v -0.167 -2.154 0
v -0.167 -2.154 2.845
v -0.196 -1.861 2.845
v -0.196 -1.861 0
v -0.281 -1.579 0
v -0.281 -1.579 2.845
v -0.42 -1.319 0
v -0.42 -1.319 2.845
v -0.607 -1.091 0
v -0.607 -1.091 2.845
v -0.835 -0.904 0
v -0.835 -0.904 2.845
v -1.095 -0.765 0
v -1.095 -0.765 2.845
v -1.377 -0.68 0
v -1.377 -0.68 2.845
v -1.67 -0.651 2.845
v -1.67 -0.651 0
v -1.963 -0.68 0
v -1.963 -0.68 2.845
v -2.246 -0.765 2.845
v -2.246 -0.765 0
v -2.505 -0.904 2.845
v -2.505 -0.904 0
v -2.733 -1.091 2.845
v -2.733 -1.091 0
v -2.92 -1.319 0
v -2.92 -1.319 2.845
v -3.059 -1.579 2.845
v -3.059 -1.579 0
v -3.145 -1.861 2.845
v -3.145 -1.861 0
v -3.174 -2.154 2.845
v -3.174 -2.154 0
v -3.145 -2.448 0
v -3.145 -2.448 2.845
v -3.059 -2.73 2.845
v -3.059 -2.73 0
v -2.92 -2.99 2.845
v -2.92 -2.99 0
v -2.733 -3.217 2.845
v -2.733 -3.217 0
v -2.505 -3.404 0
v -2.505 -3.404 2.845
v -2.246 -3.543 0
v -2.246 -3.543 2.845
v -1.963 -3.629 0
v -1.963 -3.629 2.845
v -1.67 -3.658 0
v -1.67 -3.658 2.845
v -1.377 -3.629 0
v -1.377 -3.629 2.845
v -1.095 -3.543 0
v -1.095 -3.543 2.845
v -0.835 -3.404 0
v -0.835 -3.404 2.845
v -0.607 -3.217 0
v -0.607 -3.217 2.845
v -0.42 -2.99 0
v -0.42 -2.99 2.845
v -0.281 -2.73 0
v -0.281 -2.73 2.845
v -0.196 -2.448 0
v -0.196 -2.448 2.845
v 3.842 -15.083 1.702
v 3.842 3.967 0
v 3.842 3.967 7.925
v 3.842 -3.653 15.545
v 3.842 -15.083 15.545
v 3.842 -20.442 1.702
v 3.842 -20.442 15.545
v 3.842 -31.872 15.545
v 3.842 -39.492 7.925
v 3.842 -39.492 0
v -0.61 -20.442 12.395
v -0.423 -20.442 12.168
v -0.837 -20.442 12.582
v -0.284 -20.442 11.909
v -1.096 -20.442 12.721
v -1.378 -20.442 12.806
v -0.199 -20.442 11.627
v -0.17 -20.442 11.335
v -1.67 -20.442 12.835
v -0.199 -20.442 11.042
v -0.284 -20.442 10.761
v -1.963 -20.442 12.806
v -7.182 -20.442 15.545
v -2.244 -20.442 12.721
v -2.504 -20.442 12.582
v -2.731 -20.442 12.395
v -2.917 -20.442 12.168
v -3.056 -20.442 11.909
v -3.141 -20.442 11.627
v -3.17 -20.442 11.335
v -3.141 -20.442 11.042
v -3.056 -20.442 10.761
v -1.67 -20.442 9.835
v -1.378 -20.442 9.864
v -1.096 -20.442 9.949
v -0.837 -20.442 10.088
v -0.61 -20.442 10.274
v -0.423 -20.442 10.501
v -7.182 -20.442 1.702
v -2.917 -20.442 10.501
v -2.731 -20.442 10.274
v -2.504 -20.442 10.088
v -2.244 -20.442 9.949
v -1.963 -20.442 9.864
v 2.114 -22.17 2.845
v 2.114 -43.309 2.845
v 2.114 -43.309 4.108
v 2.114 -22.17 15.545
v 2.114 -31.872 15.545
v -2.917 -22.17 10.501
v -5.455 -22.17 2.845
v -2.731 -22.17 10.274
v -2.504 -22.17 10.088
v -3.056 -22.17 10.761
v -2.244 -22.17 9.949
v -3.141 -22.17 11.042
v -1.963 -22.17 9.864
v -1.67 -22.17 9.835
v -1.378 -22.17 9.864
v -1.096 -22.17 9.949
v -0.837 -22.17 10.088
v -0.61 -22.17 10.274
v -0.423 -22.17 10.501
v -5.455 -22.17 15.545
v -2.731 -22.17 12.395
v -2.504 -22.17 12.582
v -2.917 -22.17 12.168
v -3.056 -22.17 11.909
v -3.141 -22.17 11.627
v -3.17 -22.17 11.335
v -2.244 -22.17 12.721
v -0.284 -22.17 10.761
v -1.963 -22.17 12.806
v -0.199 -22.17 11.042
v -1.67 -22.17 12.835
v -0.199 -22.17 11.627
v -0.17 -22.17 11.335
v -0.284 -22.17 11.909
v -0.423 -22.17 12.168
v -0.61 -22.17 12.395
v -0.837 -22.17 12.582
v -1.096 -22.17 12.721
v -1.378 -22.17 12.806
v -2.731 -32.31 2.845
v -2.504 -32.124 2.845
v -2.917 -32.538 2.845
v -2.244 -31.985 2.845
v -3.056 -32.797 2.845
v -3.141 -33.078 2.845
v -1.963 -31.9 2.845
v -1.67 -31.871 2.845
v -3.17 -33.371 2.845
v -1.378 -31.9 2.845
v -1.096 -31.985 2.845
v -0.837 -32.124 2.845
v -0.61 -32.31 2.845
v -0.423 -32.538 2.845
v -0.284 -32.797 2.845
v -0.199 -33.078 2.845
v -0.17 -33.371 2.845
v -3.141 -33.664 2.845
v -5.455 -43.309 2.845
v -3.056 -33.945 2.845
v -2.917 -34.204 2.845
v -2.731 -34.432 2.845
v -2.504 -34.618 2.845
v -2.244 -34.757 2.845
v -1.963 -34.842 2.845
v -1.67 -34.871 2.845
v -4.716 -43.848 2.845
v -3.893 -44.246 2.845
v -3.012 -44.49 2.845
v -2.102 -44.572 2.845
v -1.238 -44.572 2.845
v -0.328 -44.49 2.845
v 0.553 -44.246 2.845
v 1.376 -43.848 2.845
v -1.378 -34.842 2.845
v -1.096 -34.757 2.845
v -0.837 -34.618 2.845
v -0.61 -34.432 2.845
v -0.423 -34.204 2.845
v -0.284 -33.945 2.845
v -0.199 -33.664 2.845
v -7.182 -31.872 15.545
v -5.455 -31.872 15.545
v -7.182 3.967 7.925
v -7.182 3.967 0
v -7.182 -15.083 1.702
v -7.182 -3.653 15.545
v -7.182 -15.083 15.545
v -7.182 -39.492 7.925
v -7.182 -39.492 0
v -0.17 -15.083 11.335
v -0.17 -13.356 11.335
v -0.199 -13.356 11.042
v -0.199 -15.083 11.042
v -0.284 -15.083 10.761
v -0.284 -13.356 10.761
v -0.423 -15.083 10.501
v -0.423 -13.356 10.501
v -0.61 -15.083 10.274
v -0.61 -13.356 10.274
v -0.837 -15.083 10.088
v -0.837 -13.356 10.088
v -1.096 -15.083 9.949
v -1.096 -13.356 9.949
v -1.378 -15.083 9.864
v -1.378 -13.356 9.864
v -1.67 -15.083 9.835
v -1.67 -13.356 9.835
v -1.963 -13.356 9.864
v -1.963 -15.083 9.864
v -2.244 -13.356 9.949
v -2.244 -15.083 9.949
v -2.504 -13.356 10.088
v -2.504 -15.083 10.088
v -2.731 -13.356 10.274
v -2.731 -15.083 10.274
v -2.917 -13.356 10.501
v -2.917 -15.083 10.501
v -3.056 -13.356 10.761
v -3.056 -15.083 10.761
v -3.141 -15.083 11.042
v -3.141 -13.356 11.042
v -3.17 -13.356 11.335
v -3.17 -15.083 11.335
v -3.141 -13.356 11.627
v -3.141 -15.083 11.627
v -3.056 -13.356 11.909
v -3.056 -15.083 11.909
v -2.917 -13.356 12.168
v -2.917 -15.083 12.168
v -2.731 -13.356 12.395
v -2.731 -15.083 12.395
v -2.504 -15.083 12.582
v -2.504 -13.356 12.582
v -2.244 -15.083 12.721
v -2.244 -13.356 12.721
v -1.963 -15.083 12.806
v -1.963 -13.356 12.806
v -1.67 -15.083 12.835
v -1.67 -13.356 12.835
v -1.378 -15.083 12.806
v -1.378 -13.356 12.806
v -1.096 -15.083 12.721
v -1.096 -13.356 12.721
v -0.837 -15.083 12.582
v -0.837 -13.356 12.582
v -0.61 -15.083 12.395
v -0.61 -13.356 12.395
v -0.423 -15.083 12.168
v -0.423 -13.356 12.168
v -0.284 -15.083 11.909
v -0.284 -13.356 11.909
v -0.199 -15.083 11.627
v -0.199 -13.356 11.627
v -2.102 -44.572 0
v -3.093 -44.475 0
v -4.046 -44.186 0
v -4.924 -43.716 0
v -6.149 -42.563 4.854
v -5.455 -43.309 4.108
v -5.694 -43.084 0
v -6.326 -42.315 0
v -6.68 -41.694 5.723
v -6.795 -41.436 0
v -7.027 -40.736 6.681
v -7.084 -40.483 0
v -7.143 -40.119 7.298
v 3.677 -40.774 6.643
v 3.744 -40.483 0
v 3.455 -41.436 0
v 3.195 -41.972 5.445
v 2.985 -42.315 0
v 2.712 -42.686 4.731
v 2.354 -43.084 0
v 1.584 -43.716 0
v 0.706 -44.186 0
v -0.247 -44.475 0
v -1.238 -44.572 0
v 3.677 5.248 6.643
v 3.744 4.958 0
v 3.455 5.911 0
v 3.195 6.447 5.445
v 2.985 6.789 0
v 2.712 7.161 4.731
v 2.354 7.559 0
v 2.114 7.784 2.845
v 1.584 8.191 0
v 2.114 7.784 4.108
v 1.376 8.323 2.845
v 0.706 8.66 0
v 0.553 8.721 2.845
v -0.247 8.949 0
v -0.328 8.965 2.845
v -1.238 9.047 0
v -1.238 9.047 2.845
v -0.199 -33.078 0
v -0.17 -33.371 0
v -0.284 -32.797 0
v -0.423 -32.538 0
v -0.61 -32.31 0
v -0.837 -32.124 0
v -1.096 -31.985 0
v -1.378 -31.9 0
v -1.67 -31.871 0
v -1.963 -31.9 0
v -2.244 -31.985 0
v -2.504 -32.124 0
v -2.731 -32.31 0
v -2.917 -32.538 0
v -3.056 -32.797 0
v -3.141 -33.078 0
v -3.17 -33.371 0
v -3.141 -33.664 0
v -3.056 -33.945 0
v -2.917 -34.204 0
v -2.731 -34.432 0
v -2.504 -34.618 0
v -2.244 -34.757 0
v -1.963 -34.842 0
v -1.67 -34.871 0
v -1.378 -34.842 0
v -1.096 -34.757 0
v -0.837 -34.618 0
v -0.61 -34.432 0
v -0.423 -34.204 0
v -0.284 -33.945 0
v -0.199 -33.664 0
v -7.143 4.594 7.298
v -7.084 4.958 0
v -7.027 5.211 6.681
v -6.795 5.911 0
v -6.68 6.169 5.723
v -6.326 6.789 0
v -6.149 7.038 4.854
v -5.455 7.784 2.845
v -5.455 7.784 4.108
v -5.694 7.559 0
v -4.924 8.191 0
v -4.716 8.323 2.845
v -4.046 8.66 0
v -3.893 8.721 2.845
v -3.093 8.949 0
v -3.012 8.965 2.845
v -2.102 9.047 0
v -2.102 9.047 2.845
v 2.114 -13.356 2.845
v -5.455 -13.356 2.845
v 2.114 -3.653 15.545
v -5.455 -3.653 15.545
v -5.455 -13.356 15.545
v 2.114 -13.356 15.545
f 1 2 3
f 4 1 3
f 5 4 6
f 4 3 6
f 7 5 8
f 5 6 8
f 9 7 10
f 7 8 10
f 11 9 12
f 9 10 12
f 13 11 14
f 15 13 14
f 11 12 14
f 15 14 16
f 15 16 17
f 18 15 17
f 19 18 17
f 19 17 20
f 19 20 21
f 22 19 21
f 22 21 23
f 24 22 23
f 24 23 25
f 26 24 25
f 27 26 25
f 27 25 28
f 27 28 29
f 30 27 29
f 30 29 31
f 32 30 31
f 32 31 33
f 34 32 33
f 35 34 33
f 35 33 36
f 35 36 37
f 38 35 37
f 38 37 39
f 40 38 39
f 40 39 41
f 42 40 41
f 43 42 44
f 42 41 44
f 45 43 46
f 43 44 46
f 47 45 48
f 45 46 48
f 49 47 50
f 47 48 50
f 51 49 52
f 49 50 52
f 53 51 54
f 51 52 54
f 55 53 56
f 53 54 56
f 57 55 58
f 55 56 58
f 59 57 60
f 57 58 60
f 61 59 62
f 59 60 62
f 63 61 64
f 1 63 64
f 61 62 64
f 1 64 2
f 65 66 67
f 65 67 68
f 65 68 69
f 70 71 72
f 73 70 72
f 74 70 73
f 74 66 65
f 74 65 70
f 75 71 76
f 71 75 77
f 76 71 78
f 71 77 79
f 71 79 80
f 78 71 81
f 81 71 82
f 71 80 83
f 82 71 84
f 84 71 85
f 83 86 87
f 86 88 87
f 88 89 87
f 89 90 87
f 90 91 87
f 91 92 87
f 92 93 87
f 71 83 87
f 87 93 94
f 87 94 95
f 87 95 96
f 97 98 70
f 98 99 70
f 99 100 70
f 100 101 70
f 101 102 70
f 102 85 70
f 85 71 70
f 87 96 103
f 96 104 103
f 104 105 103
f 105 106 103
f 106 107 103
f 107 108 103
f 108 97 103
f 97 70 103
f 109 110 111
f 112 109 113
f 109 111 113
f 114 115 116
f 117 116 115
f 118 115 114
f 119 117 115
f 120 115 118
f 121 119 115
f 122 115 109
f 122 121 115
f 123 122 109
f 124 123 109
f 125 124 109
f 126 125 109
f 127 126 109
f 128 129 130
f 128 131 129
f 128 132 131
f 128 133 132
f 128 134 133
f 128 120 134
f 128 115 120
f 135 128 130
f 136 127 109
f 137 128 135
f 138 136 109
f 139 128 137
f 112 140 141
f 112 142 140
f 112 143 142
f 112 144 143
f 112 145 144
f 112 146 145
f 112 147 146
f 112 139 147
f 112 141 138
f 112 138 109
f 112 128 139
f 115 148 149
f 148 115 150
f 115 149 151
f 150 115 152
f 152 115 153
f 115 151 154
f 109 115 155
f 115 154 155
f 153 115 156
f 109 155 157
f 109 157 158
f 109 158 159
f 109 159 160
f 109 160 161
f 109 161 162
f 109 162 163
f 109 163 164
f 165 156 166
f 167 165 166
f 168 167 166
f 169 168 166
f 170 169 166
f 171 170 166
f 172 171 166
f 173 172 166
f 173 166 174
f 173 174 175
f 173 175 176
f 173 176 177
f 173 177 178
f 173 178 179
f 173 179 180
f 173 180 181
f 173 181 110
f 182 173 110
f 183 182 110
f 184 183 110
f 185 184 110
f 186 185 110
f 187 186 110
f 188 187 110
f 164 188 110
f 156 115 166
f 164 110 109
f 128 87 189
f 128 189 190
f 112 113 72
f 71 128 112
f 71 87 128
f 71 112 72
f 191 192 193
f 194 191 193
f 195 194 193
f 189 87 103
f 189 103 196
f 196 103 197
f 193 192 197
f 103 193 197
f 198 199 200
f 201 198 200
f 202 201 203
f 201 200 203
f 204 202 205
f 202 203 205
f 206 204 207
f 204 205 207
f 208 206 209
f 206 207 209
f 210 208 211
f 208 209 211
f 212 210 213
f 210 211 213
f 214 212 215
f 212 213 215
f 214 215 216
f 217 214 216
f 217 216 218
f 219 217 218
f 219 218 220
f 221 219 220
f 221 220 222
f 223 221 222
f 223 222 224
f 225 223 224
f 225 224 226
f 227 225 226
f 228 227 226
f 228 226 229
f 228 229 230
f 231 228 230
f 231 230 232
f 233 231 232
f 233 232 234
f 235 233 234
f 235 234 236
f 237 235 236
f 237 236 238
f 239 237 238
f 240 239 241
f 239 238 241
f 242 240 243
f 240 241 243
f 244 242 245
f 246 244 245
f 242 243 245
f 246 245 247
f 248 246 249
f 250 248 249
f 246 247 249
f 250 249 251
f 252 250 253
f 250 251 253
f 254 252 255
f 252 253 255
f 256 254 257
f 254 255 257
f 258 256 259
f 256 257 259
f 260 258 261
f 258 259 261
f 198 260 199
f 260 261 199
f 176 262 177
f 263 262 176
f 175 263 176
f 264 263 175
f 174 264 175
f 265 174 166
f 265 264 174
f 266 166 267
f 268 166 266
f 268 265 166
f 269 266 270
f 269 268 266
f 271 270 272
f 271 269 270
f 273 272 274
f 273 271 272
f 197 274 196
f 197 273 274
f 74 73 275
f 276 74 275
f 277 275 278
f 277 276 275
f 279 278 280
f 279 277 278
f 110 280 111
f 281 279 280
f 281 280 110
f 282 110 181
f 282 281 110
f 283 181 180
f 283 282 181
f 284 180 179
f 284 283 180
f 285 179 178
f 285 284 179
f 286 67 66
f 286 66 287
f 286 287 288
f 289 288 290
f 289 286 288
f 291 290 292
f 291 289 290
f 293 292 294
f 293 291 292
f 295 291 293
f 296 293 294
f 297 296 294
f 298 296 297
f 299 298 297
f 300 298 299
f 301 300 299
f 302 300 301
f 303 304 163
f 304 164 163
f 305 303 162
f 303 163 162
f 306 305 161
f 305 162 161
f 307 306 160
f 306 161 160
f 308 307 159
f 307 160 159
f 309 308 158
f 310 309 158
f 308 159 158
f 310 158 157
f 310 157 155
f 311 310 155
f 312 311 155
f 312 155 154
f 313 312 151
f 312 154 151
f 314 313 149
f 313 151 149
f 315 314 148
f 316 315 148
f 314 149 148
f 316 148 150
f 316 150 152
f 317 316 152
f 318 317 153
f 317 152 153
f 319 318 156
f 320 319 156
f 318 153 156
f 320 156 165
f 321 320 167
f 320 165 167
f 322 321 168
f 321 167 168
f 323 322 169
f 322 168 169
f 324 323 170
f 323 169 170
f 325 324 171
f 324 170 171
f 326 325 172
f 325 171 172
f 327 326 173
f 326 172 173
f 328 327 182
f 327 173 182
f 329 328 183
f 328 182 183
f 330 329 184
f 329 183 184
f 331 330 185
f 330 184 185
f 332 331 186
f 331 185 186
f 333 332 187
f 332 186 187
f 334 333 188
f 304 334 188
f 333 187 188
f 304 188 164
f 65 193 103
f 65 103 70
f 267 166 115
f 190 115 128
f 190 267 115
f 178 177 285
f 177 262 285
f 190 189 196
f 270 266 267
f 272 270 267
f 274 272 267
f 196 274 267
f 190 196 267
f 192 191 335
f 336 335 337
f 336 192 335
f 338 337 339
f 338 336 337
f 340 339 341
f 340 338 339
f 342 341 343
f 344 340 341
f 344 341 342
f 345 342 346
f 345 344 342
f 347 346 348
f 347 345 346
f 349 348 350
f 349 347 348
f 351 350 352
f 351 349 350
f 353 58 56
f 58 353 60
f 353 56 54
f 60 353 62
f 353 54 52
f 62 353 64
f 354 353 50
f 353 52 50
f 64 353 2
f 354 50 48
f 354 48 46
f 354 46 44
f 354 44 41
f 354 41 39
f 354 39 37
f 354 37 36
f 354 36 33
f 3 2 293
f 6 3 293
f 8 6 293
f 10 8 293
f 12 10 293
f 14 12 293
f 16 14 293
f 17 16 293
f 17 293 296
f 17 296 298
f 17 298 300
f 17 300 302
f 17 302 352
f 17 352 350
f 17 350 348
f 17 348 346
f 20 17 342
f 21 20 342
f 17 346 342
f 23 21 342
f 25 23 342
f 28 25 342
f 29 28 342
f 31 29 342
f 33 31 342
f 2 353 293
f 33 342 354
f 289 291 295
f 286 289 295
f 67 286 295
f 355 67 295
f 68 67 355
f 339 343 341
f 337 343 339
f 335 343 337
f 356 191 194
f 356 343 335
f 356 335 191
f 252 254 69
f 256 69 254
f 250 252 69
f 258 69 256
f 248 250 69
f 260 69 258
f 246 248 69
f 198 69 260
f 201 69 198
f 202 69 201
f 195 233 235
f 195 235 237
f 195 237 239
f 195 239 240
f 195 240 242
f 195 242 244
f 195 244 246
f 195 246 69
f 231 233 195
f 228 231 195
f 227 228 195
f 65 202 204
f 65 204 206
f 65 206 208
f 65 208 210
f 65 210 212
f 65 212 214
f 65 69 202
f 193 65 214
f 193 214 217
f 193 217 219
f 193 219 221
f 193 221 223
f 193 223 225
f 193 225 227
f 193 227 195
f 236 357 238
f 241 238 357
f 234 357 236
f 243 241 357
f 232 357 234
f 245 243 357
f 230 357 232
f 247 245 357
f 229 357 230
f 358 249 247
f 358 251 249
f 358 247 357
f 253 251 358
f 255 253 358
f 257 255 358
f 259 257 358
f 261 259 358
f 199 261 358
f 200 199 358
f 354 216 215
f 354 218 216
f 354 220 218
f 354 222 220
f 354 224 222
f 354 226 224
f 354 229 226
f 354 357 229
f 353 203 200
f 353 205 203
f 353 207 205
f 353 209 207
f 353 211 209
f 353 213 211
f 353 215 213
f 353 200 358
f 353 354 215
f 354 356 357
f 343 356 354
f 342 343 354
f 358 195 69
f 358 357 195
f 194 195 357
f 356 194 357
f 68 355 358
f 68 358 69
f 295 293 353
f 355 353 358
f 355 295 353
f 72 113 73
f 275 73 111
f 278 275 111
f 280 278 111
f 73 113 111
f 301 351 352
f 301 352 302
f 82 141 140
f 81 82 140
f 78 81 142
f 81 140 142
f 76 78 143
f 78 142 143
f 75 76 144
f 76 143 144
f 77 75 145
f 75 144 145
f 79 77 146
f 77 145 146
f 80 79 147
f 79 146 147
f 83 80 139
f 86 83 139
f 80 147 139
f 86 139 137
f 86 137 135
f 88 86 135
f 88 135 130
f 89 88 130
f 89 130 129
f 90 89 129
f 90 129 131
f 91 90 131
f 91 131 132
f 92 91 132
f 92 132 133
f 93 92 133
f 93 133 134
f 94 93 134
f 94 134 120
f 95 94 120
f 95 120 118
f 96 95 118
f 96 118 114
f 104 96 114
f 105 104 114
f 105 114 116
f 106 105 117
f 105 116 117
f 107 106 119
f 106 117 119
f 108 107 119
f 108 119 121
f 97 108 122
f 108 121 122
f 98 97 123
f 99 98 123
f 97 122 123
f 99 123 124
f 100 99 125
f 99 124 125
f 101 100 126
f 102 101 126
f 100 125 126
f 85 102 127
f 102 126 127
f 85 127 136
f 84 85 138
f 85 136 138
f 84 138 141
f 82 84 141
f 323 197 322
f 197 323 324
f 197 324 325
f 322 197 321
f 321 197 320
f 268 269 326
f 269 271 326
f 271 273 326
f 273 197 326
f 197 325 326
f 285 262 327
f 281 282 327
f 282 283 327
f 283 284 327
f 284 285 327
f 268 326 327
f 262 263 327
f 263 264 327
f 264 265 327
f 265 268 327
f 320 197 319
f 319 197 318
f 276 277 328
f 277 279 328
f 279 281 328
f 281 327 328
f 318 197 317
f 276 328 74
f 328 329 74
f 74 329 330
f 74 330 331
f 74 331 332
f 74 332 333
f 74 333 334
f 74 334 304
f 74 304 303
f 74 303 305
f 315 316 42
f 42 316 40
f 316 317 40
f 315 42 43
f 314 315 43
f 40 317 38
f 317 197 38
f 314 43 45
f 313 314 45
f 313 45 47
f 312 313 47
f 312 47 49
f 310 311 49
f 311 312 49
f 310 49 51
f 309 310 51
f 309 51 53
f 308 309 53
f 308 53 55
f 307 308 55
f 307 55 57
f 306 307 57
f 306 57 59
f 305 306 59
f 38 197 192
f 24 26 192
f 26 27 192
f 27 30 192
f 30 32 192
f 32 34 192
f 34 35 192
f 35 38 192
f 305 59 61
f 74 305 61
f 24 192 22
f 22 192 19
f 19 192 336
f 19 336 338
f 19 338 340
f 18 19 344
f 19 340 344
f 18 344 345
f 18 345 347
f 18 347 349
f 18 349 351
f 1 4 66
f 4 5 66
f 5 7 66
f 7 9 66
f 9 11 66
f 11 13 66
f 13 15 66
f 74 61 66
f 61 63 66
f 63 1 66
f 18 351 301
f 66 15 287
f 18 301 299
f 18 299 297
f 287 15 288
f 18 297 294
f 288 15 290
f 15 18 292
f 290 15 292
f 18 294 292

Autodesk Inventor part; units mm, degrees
ref_plane "YZ Plane" through (0, 0, 0) normal (1, 0, 0) x (0, 1, 0)
ref_plane "XZ Plane" through (0, 0, 0) normal (0, 1, 0) x (-1, 0, 0)
ref_plane "XY Plane" through (0, 0, 0) normal (0, 0, 1) x (1, 0, 0)
sketch "Sketch1" plane through (0, 0, 0) normal (0, 0, 1) x (1, 0, 0)
  line L0 (-7.182, 9.0471) -> (3.8416, 9.0471)
  line L1 (3.8416, 9.0471) -> (3.8416, -44.5723)
  line L2 (3.8416, -44.5723) -> (-7.182, -44.5723)
  line L3 (-7.182, -44.5723) -> (-7.182, 9.0471)
  point P0 (0, 0)
  dimension "d0" = 11.0236
  dimension "d1" = 53.6194
extrude "Extrusion1" add sketch "Sketch1" along normal blind 1.7018
sketch "Sketch2" plane through (0, 0, 1.7018) normal (0, 0, 1) x (1, 0, 0)
  line L0 (3.8416, 9.0471) -> (-7.182, 9.0471) projected
  line L1 (3.8416, -44.5723) -> (3.8416, 9.0471) projected
  line L2 (-7.182, 9.0471) -> (3.8416, 9.0471)
  line L3 (3.8416, 9.0471) -> (3.8416, -15.0829)
  line L4 (3.8416, -15.0829) -> (-7.182, -15.0829)
  line L5 (-7.182, -15.0829) -> (-7.182, 9.0471)
  point P0 (0, 0)
  dimension "d4" = 24.13
extrude "Extrusion2" add sketch "Sketch2" along normal blind 13.843
sketch "Sketch3" plane through (-7.182, 9.0471, 0) normal (0, 1, 0) x (1, 0, 0)
  circle A0 centre (5.5118, -11.3348) radius 1.5
  line L0 (11.0236, -15.5448) -> (0, -15.5448) projected
  point P0 (7.182, 0)
  dimension "d7" = 3
  dimension "d8" = 4.21
extrude "Extrusion3" cut sketch "Sketch3" against normal blind 25.4
chamfer "Chamfer1" distance 12.7 angle 45 1 edges at (-1.6702, 9.0471, 15.5448)
sketch "Sketch4" plane through (-7.182, 9.0471, 0) normal (0, 1, 0) x (1, 0, 0)
  line L0 (11.0236, -2.8448) -> (0, -2.8448) projected
  line L1 (0, -15.5448) -> (11.0236, -15.5448) projected
  line L2 (1.7272, -2.8448) -> (9.2964, -2.8448)
  line L3 (9.2964, -2.8448) -> (9.2964, -15.5448)
  line L4 (9.2964, -15.5448) -> (1.7272, -15.5448)
  line L5 (1.7272, -15.5448) -> (1.7272, -2.8448)
  point P0 (7.182, 0)
  dimension "d14" = 1.7272
  dimension "d15" = 1.7272
extrude "Extrusion4" cut sketch "Sketch4" against normal blind 22.4028
sketch "Sketch5" plane through (0, 0, 1.7018) normal (0, 0, 1) x (1, 0, 0)
  line L0 (-7.182, -44.5723) -> (3.8416, -44.5723) projected
  line L1 (3.8416, 9.0471) -> (3.8416, -44.5723) projected
  line L2 (-7.182, -44.5723) -> (3.8416, -44.5723)
  line L3 (3.8416, -44.5723) -> (3.8416, -20.4423)
  line L4 (3.8416, -20.4423) -> (-7.182, -20.4423)
  line L5 (-7.182, -20.4423) -> (-7.182, -44.5723)
  point P0 (0, 0)
  dimension "d18" = 24.13
extrude "Extrusion5" add sketch "Sketch5" along normal blind 13.843
sketch "Sketch6" plane through (-7.182, -44.5723, 0) normal (0, -1, 0) x (1, 0, 0)
  circle A0 centre (5.5118, 11.3348) radius 1.5 projected
  circle A1 centre (5.5118, 11.3348) radius 1.5
  point P0 (7.182, 0)
extrude "Extrusion6" cut sketch "Sketch6" against normal blind 39.243
chamfer "Chamfer2" distance 12.7 angle 45 1 edges at (-1.6702, -44.5723, 15.5448)
sketch "Sketch7" plane through (-7.182, -44.5723, 0) normal (0, -1, 0) x (1, 0, 0)
  line L0 (1.7272, 2.8448) -> (9.2964, 2.8448) projected
  line L1 (9.2964, 2.8448) -> (9.2964, 15.5448) projected
  line L2 (9.2964, 15.5448) -> (1.7272, 15.5448) projected
  line L3 (9.2964, 2.8448) -> (1.7272, 2.8448)
  line L4 (1.7272, 2.8448) -> (1.7272, 15.5448)
  line L5 (1.7272, 15.5448) -> (9.2964, 15.5448)
  line L6 (9.2964, 15.5448) -> (9.2964, 2.8448)
  point P0 (7.182, 0)
extrude "Extrusion7" cut sketch "Sketch7" against normal blind 22.4028
sketch "Sketch8" plane through (-5.4548, -44.5723, 2.8448) normal (0, 0, 1) x (1, 0, 0)
  circle A0 centre (3.7846, 11.2014) radius 1.5
  circle A1 centre (3.7846, 42.418) radius 1.5034
  line L0 (0, 0) -> (7.5692, 0) projected
  line L1 (7.5692, 53.6194) -> (0, 53.6194) projected
  point P0 (5.4548, 44.5723)
  dimension "d28" = 3
  dimension "d29" = 3.0067
  dimension "d30" = 11.2014
  dimension "d31" = 11.2014
extrude "Extrusion8" cut sketch "Sketch8" against normal blind 22.4028
fillet "Fillet1" radius 5.08 4 edges at (-7.182, 9.0471, 1.4224) (3.8416, 9.0471, 1.4224) (-7.182, -44.5723, 1.4224) (3.8416, -44.5723, 1.4224)
equation "\"d15\" = d14"
equation "\"d31\" = d30"
properties part number "Control board Holder"
